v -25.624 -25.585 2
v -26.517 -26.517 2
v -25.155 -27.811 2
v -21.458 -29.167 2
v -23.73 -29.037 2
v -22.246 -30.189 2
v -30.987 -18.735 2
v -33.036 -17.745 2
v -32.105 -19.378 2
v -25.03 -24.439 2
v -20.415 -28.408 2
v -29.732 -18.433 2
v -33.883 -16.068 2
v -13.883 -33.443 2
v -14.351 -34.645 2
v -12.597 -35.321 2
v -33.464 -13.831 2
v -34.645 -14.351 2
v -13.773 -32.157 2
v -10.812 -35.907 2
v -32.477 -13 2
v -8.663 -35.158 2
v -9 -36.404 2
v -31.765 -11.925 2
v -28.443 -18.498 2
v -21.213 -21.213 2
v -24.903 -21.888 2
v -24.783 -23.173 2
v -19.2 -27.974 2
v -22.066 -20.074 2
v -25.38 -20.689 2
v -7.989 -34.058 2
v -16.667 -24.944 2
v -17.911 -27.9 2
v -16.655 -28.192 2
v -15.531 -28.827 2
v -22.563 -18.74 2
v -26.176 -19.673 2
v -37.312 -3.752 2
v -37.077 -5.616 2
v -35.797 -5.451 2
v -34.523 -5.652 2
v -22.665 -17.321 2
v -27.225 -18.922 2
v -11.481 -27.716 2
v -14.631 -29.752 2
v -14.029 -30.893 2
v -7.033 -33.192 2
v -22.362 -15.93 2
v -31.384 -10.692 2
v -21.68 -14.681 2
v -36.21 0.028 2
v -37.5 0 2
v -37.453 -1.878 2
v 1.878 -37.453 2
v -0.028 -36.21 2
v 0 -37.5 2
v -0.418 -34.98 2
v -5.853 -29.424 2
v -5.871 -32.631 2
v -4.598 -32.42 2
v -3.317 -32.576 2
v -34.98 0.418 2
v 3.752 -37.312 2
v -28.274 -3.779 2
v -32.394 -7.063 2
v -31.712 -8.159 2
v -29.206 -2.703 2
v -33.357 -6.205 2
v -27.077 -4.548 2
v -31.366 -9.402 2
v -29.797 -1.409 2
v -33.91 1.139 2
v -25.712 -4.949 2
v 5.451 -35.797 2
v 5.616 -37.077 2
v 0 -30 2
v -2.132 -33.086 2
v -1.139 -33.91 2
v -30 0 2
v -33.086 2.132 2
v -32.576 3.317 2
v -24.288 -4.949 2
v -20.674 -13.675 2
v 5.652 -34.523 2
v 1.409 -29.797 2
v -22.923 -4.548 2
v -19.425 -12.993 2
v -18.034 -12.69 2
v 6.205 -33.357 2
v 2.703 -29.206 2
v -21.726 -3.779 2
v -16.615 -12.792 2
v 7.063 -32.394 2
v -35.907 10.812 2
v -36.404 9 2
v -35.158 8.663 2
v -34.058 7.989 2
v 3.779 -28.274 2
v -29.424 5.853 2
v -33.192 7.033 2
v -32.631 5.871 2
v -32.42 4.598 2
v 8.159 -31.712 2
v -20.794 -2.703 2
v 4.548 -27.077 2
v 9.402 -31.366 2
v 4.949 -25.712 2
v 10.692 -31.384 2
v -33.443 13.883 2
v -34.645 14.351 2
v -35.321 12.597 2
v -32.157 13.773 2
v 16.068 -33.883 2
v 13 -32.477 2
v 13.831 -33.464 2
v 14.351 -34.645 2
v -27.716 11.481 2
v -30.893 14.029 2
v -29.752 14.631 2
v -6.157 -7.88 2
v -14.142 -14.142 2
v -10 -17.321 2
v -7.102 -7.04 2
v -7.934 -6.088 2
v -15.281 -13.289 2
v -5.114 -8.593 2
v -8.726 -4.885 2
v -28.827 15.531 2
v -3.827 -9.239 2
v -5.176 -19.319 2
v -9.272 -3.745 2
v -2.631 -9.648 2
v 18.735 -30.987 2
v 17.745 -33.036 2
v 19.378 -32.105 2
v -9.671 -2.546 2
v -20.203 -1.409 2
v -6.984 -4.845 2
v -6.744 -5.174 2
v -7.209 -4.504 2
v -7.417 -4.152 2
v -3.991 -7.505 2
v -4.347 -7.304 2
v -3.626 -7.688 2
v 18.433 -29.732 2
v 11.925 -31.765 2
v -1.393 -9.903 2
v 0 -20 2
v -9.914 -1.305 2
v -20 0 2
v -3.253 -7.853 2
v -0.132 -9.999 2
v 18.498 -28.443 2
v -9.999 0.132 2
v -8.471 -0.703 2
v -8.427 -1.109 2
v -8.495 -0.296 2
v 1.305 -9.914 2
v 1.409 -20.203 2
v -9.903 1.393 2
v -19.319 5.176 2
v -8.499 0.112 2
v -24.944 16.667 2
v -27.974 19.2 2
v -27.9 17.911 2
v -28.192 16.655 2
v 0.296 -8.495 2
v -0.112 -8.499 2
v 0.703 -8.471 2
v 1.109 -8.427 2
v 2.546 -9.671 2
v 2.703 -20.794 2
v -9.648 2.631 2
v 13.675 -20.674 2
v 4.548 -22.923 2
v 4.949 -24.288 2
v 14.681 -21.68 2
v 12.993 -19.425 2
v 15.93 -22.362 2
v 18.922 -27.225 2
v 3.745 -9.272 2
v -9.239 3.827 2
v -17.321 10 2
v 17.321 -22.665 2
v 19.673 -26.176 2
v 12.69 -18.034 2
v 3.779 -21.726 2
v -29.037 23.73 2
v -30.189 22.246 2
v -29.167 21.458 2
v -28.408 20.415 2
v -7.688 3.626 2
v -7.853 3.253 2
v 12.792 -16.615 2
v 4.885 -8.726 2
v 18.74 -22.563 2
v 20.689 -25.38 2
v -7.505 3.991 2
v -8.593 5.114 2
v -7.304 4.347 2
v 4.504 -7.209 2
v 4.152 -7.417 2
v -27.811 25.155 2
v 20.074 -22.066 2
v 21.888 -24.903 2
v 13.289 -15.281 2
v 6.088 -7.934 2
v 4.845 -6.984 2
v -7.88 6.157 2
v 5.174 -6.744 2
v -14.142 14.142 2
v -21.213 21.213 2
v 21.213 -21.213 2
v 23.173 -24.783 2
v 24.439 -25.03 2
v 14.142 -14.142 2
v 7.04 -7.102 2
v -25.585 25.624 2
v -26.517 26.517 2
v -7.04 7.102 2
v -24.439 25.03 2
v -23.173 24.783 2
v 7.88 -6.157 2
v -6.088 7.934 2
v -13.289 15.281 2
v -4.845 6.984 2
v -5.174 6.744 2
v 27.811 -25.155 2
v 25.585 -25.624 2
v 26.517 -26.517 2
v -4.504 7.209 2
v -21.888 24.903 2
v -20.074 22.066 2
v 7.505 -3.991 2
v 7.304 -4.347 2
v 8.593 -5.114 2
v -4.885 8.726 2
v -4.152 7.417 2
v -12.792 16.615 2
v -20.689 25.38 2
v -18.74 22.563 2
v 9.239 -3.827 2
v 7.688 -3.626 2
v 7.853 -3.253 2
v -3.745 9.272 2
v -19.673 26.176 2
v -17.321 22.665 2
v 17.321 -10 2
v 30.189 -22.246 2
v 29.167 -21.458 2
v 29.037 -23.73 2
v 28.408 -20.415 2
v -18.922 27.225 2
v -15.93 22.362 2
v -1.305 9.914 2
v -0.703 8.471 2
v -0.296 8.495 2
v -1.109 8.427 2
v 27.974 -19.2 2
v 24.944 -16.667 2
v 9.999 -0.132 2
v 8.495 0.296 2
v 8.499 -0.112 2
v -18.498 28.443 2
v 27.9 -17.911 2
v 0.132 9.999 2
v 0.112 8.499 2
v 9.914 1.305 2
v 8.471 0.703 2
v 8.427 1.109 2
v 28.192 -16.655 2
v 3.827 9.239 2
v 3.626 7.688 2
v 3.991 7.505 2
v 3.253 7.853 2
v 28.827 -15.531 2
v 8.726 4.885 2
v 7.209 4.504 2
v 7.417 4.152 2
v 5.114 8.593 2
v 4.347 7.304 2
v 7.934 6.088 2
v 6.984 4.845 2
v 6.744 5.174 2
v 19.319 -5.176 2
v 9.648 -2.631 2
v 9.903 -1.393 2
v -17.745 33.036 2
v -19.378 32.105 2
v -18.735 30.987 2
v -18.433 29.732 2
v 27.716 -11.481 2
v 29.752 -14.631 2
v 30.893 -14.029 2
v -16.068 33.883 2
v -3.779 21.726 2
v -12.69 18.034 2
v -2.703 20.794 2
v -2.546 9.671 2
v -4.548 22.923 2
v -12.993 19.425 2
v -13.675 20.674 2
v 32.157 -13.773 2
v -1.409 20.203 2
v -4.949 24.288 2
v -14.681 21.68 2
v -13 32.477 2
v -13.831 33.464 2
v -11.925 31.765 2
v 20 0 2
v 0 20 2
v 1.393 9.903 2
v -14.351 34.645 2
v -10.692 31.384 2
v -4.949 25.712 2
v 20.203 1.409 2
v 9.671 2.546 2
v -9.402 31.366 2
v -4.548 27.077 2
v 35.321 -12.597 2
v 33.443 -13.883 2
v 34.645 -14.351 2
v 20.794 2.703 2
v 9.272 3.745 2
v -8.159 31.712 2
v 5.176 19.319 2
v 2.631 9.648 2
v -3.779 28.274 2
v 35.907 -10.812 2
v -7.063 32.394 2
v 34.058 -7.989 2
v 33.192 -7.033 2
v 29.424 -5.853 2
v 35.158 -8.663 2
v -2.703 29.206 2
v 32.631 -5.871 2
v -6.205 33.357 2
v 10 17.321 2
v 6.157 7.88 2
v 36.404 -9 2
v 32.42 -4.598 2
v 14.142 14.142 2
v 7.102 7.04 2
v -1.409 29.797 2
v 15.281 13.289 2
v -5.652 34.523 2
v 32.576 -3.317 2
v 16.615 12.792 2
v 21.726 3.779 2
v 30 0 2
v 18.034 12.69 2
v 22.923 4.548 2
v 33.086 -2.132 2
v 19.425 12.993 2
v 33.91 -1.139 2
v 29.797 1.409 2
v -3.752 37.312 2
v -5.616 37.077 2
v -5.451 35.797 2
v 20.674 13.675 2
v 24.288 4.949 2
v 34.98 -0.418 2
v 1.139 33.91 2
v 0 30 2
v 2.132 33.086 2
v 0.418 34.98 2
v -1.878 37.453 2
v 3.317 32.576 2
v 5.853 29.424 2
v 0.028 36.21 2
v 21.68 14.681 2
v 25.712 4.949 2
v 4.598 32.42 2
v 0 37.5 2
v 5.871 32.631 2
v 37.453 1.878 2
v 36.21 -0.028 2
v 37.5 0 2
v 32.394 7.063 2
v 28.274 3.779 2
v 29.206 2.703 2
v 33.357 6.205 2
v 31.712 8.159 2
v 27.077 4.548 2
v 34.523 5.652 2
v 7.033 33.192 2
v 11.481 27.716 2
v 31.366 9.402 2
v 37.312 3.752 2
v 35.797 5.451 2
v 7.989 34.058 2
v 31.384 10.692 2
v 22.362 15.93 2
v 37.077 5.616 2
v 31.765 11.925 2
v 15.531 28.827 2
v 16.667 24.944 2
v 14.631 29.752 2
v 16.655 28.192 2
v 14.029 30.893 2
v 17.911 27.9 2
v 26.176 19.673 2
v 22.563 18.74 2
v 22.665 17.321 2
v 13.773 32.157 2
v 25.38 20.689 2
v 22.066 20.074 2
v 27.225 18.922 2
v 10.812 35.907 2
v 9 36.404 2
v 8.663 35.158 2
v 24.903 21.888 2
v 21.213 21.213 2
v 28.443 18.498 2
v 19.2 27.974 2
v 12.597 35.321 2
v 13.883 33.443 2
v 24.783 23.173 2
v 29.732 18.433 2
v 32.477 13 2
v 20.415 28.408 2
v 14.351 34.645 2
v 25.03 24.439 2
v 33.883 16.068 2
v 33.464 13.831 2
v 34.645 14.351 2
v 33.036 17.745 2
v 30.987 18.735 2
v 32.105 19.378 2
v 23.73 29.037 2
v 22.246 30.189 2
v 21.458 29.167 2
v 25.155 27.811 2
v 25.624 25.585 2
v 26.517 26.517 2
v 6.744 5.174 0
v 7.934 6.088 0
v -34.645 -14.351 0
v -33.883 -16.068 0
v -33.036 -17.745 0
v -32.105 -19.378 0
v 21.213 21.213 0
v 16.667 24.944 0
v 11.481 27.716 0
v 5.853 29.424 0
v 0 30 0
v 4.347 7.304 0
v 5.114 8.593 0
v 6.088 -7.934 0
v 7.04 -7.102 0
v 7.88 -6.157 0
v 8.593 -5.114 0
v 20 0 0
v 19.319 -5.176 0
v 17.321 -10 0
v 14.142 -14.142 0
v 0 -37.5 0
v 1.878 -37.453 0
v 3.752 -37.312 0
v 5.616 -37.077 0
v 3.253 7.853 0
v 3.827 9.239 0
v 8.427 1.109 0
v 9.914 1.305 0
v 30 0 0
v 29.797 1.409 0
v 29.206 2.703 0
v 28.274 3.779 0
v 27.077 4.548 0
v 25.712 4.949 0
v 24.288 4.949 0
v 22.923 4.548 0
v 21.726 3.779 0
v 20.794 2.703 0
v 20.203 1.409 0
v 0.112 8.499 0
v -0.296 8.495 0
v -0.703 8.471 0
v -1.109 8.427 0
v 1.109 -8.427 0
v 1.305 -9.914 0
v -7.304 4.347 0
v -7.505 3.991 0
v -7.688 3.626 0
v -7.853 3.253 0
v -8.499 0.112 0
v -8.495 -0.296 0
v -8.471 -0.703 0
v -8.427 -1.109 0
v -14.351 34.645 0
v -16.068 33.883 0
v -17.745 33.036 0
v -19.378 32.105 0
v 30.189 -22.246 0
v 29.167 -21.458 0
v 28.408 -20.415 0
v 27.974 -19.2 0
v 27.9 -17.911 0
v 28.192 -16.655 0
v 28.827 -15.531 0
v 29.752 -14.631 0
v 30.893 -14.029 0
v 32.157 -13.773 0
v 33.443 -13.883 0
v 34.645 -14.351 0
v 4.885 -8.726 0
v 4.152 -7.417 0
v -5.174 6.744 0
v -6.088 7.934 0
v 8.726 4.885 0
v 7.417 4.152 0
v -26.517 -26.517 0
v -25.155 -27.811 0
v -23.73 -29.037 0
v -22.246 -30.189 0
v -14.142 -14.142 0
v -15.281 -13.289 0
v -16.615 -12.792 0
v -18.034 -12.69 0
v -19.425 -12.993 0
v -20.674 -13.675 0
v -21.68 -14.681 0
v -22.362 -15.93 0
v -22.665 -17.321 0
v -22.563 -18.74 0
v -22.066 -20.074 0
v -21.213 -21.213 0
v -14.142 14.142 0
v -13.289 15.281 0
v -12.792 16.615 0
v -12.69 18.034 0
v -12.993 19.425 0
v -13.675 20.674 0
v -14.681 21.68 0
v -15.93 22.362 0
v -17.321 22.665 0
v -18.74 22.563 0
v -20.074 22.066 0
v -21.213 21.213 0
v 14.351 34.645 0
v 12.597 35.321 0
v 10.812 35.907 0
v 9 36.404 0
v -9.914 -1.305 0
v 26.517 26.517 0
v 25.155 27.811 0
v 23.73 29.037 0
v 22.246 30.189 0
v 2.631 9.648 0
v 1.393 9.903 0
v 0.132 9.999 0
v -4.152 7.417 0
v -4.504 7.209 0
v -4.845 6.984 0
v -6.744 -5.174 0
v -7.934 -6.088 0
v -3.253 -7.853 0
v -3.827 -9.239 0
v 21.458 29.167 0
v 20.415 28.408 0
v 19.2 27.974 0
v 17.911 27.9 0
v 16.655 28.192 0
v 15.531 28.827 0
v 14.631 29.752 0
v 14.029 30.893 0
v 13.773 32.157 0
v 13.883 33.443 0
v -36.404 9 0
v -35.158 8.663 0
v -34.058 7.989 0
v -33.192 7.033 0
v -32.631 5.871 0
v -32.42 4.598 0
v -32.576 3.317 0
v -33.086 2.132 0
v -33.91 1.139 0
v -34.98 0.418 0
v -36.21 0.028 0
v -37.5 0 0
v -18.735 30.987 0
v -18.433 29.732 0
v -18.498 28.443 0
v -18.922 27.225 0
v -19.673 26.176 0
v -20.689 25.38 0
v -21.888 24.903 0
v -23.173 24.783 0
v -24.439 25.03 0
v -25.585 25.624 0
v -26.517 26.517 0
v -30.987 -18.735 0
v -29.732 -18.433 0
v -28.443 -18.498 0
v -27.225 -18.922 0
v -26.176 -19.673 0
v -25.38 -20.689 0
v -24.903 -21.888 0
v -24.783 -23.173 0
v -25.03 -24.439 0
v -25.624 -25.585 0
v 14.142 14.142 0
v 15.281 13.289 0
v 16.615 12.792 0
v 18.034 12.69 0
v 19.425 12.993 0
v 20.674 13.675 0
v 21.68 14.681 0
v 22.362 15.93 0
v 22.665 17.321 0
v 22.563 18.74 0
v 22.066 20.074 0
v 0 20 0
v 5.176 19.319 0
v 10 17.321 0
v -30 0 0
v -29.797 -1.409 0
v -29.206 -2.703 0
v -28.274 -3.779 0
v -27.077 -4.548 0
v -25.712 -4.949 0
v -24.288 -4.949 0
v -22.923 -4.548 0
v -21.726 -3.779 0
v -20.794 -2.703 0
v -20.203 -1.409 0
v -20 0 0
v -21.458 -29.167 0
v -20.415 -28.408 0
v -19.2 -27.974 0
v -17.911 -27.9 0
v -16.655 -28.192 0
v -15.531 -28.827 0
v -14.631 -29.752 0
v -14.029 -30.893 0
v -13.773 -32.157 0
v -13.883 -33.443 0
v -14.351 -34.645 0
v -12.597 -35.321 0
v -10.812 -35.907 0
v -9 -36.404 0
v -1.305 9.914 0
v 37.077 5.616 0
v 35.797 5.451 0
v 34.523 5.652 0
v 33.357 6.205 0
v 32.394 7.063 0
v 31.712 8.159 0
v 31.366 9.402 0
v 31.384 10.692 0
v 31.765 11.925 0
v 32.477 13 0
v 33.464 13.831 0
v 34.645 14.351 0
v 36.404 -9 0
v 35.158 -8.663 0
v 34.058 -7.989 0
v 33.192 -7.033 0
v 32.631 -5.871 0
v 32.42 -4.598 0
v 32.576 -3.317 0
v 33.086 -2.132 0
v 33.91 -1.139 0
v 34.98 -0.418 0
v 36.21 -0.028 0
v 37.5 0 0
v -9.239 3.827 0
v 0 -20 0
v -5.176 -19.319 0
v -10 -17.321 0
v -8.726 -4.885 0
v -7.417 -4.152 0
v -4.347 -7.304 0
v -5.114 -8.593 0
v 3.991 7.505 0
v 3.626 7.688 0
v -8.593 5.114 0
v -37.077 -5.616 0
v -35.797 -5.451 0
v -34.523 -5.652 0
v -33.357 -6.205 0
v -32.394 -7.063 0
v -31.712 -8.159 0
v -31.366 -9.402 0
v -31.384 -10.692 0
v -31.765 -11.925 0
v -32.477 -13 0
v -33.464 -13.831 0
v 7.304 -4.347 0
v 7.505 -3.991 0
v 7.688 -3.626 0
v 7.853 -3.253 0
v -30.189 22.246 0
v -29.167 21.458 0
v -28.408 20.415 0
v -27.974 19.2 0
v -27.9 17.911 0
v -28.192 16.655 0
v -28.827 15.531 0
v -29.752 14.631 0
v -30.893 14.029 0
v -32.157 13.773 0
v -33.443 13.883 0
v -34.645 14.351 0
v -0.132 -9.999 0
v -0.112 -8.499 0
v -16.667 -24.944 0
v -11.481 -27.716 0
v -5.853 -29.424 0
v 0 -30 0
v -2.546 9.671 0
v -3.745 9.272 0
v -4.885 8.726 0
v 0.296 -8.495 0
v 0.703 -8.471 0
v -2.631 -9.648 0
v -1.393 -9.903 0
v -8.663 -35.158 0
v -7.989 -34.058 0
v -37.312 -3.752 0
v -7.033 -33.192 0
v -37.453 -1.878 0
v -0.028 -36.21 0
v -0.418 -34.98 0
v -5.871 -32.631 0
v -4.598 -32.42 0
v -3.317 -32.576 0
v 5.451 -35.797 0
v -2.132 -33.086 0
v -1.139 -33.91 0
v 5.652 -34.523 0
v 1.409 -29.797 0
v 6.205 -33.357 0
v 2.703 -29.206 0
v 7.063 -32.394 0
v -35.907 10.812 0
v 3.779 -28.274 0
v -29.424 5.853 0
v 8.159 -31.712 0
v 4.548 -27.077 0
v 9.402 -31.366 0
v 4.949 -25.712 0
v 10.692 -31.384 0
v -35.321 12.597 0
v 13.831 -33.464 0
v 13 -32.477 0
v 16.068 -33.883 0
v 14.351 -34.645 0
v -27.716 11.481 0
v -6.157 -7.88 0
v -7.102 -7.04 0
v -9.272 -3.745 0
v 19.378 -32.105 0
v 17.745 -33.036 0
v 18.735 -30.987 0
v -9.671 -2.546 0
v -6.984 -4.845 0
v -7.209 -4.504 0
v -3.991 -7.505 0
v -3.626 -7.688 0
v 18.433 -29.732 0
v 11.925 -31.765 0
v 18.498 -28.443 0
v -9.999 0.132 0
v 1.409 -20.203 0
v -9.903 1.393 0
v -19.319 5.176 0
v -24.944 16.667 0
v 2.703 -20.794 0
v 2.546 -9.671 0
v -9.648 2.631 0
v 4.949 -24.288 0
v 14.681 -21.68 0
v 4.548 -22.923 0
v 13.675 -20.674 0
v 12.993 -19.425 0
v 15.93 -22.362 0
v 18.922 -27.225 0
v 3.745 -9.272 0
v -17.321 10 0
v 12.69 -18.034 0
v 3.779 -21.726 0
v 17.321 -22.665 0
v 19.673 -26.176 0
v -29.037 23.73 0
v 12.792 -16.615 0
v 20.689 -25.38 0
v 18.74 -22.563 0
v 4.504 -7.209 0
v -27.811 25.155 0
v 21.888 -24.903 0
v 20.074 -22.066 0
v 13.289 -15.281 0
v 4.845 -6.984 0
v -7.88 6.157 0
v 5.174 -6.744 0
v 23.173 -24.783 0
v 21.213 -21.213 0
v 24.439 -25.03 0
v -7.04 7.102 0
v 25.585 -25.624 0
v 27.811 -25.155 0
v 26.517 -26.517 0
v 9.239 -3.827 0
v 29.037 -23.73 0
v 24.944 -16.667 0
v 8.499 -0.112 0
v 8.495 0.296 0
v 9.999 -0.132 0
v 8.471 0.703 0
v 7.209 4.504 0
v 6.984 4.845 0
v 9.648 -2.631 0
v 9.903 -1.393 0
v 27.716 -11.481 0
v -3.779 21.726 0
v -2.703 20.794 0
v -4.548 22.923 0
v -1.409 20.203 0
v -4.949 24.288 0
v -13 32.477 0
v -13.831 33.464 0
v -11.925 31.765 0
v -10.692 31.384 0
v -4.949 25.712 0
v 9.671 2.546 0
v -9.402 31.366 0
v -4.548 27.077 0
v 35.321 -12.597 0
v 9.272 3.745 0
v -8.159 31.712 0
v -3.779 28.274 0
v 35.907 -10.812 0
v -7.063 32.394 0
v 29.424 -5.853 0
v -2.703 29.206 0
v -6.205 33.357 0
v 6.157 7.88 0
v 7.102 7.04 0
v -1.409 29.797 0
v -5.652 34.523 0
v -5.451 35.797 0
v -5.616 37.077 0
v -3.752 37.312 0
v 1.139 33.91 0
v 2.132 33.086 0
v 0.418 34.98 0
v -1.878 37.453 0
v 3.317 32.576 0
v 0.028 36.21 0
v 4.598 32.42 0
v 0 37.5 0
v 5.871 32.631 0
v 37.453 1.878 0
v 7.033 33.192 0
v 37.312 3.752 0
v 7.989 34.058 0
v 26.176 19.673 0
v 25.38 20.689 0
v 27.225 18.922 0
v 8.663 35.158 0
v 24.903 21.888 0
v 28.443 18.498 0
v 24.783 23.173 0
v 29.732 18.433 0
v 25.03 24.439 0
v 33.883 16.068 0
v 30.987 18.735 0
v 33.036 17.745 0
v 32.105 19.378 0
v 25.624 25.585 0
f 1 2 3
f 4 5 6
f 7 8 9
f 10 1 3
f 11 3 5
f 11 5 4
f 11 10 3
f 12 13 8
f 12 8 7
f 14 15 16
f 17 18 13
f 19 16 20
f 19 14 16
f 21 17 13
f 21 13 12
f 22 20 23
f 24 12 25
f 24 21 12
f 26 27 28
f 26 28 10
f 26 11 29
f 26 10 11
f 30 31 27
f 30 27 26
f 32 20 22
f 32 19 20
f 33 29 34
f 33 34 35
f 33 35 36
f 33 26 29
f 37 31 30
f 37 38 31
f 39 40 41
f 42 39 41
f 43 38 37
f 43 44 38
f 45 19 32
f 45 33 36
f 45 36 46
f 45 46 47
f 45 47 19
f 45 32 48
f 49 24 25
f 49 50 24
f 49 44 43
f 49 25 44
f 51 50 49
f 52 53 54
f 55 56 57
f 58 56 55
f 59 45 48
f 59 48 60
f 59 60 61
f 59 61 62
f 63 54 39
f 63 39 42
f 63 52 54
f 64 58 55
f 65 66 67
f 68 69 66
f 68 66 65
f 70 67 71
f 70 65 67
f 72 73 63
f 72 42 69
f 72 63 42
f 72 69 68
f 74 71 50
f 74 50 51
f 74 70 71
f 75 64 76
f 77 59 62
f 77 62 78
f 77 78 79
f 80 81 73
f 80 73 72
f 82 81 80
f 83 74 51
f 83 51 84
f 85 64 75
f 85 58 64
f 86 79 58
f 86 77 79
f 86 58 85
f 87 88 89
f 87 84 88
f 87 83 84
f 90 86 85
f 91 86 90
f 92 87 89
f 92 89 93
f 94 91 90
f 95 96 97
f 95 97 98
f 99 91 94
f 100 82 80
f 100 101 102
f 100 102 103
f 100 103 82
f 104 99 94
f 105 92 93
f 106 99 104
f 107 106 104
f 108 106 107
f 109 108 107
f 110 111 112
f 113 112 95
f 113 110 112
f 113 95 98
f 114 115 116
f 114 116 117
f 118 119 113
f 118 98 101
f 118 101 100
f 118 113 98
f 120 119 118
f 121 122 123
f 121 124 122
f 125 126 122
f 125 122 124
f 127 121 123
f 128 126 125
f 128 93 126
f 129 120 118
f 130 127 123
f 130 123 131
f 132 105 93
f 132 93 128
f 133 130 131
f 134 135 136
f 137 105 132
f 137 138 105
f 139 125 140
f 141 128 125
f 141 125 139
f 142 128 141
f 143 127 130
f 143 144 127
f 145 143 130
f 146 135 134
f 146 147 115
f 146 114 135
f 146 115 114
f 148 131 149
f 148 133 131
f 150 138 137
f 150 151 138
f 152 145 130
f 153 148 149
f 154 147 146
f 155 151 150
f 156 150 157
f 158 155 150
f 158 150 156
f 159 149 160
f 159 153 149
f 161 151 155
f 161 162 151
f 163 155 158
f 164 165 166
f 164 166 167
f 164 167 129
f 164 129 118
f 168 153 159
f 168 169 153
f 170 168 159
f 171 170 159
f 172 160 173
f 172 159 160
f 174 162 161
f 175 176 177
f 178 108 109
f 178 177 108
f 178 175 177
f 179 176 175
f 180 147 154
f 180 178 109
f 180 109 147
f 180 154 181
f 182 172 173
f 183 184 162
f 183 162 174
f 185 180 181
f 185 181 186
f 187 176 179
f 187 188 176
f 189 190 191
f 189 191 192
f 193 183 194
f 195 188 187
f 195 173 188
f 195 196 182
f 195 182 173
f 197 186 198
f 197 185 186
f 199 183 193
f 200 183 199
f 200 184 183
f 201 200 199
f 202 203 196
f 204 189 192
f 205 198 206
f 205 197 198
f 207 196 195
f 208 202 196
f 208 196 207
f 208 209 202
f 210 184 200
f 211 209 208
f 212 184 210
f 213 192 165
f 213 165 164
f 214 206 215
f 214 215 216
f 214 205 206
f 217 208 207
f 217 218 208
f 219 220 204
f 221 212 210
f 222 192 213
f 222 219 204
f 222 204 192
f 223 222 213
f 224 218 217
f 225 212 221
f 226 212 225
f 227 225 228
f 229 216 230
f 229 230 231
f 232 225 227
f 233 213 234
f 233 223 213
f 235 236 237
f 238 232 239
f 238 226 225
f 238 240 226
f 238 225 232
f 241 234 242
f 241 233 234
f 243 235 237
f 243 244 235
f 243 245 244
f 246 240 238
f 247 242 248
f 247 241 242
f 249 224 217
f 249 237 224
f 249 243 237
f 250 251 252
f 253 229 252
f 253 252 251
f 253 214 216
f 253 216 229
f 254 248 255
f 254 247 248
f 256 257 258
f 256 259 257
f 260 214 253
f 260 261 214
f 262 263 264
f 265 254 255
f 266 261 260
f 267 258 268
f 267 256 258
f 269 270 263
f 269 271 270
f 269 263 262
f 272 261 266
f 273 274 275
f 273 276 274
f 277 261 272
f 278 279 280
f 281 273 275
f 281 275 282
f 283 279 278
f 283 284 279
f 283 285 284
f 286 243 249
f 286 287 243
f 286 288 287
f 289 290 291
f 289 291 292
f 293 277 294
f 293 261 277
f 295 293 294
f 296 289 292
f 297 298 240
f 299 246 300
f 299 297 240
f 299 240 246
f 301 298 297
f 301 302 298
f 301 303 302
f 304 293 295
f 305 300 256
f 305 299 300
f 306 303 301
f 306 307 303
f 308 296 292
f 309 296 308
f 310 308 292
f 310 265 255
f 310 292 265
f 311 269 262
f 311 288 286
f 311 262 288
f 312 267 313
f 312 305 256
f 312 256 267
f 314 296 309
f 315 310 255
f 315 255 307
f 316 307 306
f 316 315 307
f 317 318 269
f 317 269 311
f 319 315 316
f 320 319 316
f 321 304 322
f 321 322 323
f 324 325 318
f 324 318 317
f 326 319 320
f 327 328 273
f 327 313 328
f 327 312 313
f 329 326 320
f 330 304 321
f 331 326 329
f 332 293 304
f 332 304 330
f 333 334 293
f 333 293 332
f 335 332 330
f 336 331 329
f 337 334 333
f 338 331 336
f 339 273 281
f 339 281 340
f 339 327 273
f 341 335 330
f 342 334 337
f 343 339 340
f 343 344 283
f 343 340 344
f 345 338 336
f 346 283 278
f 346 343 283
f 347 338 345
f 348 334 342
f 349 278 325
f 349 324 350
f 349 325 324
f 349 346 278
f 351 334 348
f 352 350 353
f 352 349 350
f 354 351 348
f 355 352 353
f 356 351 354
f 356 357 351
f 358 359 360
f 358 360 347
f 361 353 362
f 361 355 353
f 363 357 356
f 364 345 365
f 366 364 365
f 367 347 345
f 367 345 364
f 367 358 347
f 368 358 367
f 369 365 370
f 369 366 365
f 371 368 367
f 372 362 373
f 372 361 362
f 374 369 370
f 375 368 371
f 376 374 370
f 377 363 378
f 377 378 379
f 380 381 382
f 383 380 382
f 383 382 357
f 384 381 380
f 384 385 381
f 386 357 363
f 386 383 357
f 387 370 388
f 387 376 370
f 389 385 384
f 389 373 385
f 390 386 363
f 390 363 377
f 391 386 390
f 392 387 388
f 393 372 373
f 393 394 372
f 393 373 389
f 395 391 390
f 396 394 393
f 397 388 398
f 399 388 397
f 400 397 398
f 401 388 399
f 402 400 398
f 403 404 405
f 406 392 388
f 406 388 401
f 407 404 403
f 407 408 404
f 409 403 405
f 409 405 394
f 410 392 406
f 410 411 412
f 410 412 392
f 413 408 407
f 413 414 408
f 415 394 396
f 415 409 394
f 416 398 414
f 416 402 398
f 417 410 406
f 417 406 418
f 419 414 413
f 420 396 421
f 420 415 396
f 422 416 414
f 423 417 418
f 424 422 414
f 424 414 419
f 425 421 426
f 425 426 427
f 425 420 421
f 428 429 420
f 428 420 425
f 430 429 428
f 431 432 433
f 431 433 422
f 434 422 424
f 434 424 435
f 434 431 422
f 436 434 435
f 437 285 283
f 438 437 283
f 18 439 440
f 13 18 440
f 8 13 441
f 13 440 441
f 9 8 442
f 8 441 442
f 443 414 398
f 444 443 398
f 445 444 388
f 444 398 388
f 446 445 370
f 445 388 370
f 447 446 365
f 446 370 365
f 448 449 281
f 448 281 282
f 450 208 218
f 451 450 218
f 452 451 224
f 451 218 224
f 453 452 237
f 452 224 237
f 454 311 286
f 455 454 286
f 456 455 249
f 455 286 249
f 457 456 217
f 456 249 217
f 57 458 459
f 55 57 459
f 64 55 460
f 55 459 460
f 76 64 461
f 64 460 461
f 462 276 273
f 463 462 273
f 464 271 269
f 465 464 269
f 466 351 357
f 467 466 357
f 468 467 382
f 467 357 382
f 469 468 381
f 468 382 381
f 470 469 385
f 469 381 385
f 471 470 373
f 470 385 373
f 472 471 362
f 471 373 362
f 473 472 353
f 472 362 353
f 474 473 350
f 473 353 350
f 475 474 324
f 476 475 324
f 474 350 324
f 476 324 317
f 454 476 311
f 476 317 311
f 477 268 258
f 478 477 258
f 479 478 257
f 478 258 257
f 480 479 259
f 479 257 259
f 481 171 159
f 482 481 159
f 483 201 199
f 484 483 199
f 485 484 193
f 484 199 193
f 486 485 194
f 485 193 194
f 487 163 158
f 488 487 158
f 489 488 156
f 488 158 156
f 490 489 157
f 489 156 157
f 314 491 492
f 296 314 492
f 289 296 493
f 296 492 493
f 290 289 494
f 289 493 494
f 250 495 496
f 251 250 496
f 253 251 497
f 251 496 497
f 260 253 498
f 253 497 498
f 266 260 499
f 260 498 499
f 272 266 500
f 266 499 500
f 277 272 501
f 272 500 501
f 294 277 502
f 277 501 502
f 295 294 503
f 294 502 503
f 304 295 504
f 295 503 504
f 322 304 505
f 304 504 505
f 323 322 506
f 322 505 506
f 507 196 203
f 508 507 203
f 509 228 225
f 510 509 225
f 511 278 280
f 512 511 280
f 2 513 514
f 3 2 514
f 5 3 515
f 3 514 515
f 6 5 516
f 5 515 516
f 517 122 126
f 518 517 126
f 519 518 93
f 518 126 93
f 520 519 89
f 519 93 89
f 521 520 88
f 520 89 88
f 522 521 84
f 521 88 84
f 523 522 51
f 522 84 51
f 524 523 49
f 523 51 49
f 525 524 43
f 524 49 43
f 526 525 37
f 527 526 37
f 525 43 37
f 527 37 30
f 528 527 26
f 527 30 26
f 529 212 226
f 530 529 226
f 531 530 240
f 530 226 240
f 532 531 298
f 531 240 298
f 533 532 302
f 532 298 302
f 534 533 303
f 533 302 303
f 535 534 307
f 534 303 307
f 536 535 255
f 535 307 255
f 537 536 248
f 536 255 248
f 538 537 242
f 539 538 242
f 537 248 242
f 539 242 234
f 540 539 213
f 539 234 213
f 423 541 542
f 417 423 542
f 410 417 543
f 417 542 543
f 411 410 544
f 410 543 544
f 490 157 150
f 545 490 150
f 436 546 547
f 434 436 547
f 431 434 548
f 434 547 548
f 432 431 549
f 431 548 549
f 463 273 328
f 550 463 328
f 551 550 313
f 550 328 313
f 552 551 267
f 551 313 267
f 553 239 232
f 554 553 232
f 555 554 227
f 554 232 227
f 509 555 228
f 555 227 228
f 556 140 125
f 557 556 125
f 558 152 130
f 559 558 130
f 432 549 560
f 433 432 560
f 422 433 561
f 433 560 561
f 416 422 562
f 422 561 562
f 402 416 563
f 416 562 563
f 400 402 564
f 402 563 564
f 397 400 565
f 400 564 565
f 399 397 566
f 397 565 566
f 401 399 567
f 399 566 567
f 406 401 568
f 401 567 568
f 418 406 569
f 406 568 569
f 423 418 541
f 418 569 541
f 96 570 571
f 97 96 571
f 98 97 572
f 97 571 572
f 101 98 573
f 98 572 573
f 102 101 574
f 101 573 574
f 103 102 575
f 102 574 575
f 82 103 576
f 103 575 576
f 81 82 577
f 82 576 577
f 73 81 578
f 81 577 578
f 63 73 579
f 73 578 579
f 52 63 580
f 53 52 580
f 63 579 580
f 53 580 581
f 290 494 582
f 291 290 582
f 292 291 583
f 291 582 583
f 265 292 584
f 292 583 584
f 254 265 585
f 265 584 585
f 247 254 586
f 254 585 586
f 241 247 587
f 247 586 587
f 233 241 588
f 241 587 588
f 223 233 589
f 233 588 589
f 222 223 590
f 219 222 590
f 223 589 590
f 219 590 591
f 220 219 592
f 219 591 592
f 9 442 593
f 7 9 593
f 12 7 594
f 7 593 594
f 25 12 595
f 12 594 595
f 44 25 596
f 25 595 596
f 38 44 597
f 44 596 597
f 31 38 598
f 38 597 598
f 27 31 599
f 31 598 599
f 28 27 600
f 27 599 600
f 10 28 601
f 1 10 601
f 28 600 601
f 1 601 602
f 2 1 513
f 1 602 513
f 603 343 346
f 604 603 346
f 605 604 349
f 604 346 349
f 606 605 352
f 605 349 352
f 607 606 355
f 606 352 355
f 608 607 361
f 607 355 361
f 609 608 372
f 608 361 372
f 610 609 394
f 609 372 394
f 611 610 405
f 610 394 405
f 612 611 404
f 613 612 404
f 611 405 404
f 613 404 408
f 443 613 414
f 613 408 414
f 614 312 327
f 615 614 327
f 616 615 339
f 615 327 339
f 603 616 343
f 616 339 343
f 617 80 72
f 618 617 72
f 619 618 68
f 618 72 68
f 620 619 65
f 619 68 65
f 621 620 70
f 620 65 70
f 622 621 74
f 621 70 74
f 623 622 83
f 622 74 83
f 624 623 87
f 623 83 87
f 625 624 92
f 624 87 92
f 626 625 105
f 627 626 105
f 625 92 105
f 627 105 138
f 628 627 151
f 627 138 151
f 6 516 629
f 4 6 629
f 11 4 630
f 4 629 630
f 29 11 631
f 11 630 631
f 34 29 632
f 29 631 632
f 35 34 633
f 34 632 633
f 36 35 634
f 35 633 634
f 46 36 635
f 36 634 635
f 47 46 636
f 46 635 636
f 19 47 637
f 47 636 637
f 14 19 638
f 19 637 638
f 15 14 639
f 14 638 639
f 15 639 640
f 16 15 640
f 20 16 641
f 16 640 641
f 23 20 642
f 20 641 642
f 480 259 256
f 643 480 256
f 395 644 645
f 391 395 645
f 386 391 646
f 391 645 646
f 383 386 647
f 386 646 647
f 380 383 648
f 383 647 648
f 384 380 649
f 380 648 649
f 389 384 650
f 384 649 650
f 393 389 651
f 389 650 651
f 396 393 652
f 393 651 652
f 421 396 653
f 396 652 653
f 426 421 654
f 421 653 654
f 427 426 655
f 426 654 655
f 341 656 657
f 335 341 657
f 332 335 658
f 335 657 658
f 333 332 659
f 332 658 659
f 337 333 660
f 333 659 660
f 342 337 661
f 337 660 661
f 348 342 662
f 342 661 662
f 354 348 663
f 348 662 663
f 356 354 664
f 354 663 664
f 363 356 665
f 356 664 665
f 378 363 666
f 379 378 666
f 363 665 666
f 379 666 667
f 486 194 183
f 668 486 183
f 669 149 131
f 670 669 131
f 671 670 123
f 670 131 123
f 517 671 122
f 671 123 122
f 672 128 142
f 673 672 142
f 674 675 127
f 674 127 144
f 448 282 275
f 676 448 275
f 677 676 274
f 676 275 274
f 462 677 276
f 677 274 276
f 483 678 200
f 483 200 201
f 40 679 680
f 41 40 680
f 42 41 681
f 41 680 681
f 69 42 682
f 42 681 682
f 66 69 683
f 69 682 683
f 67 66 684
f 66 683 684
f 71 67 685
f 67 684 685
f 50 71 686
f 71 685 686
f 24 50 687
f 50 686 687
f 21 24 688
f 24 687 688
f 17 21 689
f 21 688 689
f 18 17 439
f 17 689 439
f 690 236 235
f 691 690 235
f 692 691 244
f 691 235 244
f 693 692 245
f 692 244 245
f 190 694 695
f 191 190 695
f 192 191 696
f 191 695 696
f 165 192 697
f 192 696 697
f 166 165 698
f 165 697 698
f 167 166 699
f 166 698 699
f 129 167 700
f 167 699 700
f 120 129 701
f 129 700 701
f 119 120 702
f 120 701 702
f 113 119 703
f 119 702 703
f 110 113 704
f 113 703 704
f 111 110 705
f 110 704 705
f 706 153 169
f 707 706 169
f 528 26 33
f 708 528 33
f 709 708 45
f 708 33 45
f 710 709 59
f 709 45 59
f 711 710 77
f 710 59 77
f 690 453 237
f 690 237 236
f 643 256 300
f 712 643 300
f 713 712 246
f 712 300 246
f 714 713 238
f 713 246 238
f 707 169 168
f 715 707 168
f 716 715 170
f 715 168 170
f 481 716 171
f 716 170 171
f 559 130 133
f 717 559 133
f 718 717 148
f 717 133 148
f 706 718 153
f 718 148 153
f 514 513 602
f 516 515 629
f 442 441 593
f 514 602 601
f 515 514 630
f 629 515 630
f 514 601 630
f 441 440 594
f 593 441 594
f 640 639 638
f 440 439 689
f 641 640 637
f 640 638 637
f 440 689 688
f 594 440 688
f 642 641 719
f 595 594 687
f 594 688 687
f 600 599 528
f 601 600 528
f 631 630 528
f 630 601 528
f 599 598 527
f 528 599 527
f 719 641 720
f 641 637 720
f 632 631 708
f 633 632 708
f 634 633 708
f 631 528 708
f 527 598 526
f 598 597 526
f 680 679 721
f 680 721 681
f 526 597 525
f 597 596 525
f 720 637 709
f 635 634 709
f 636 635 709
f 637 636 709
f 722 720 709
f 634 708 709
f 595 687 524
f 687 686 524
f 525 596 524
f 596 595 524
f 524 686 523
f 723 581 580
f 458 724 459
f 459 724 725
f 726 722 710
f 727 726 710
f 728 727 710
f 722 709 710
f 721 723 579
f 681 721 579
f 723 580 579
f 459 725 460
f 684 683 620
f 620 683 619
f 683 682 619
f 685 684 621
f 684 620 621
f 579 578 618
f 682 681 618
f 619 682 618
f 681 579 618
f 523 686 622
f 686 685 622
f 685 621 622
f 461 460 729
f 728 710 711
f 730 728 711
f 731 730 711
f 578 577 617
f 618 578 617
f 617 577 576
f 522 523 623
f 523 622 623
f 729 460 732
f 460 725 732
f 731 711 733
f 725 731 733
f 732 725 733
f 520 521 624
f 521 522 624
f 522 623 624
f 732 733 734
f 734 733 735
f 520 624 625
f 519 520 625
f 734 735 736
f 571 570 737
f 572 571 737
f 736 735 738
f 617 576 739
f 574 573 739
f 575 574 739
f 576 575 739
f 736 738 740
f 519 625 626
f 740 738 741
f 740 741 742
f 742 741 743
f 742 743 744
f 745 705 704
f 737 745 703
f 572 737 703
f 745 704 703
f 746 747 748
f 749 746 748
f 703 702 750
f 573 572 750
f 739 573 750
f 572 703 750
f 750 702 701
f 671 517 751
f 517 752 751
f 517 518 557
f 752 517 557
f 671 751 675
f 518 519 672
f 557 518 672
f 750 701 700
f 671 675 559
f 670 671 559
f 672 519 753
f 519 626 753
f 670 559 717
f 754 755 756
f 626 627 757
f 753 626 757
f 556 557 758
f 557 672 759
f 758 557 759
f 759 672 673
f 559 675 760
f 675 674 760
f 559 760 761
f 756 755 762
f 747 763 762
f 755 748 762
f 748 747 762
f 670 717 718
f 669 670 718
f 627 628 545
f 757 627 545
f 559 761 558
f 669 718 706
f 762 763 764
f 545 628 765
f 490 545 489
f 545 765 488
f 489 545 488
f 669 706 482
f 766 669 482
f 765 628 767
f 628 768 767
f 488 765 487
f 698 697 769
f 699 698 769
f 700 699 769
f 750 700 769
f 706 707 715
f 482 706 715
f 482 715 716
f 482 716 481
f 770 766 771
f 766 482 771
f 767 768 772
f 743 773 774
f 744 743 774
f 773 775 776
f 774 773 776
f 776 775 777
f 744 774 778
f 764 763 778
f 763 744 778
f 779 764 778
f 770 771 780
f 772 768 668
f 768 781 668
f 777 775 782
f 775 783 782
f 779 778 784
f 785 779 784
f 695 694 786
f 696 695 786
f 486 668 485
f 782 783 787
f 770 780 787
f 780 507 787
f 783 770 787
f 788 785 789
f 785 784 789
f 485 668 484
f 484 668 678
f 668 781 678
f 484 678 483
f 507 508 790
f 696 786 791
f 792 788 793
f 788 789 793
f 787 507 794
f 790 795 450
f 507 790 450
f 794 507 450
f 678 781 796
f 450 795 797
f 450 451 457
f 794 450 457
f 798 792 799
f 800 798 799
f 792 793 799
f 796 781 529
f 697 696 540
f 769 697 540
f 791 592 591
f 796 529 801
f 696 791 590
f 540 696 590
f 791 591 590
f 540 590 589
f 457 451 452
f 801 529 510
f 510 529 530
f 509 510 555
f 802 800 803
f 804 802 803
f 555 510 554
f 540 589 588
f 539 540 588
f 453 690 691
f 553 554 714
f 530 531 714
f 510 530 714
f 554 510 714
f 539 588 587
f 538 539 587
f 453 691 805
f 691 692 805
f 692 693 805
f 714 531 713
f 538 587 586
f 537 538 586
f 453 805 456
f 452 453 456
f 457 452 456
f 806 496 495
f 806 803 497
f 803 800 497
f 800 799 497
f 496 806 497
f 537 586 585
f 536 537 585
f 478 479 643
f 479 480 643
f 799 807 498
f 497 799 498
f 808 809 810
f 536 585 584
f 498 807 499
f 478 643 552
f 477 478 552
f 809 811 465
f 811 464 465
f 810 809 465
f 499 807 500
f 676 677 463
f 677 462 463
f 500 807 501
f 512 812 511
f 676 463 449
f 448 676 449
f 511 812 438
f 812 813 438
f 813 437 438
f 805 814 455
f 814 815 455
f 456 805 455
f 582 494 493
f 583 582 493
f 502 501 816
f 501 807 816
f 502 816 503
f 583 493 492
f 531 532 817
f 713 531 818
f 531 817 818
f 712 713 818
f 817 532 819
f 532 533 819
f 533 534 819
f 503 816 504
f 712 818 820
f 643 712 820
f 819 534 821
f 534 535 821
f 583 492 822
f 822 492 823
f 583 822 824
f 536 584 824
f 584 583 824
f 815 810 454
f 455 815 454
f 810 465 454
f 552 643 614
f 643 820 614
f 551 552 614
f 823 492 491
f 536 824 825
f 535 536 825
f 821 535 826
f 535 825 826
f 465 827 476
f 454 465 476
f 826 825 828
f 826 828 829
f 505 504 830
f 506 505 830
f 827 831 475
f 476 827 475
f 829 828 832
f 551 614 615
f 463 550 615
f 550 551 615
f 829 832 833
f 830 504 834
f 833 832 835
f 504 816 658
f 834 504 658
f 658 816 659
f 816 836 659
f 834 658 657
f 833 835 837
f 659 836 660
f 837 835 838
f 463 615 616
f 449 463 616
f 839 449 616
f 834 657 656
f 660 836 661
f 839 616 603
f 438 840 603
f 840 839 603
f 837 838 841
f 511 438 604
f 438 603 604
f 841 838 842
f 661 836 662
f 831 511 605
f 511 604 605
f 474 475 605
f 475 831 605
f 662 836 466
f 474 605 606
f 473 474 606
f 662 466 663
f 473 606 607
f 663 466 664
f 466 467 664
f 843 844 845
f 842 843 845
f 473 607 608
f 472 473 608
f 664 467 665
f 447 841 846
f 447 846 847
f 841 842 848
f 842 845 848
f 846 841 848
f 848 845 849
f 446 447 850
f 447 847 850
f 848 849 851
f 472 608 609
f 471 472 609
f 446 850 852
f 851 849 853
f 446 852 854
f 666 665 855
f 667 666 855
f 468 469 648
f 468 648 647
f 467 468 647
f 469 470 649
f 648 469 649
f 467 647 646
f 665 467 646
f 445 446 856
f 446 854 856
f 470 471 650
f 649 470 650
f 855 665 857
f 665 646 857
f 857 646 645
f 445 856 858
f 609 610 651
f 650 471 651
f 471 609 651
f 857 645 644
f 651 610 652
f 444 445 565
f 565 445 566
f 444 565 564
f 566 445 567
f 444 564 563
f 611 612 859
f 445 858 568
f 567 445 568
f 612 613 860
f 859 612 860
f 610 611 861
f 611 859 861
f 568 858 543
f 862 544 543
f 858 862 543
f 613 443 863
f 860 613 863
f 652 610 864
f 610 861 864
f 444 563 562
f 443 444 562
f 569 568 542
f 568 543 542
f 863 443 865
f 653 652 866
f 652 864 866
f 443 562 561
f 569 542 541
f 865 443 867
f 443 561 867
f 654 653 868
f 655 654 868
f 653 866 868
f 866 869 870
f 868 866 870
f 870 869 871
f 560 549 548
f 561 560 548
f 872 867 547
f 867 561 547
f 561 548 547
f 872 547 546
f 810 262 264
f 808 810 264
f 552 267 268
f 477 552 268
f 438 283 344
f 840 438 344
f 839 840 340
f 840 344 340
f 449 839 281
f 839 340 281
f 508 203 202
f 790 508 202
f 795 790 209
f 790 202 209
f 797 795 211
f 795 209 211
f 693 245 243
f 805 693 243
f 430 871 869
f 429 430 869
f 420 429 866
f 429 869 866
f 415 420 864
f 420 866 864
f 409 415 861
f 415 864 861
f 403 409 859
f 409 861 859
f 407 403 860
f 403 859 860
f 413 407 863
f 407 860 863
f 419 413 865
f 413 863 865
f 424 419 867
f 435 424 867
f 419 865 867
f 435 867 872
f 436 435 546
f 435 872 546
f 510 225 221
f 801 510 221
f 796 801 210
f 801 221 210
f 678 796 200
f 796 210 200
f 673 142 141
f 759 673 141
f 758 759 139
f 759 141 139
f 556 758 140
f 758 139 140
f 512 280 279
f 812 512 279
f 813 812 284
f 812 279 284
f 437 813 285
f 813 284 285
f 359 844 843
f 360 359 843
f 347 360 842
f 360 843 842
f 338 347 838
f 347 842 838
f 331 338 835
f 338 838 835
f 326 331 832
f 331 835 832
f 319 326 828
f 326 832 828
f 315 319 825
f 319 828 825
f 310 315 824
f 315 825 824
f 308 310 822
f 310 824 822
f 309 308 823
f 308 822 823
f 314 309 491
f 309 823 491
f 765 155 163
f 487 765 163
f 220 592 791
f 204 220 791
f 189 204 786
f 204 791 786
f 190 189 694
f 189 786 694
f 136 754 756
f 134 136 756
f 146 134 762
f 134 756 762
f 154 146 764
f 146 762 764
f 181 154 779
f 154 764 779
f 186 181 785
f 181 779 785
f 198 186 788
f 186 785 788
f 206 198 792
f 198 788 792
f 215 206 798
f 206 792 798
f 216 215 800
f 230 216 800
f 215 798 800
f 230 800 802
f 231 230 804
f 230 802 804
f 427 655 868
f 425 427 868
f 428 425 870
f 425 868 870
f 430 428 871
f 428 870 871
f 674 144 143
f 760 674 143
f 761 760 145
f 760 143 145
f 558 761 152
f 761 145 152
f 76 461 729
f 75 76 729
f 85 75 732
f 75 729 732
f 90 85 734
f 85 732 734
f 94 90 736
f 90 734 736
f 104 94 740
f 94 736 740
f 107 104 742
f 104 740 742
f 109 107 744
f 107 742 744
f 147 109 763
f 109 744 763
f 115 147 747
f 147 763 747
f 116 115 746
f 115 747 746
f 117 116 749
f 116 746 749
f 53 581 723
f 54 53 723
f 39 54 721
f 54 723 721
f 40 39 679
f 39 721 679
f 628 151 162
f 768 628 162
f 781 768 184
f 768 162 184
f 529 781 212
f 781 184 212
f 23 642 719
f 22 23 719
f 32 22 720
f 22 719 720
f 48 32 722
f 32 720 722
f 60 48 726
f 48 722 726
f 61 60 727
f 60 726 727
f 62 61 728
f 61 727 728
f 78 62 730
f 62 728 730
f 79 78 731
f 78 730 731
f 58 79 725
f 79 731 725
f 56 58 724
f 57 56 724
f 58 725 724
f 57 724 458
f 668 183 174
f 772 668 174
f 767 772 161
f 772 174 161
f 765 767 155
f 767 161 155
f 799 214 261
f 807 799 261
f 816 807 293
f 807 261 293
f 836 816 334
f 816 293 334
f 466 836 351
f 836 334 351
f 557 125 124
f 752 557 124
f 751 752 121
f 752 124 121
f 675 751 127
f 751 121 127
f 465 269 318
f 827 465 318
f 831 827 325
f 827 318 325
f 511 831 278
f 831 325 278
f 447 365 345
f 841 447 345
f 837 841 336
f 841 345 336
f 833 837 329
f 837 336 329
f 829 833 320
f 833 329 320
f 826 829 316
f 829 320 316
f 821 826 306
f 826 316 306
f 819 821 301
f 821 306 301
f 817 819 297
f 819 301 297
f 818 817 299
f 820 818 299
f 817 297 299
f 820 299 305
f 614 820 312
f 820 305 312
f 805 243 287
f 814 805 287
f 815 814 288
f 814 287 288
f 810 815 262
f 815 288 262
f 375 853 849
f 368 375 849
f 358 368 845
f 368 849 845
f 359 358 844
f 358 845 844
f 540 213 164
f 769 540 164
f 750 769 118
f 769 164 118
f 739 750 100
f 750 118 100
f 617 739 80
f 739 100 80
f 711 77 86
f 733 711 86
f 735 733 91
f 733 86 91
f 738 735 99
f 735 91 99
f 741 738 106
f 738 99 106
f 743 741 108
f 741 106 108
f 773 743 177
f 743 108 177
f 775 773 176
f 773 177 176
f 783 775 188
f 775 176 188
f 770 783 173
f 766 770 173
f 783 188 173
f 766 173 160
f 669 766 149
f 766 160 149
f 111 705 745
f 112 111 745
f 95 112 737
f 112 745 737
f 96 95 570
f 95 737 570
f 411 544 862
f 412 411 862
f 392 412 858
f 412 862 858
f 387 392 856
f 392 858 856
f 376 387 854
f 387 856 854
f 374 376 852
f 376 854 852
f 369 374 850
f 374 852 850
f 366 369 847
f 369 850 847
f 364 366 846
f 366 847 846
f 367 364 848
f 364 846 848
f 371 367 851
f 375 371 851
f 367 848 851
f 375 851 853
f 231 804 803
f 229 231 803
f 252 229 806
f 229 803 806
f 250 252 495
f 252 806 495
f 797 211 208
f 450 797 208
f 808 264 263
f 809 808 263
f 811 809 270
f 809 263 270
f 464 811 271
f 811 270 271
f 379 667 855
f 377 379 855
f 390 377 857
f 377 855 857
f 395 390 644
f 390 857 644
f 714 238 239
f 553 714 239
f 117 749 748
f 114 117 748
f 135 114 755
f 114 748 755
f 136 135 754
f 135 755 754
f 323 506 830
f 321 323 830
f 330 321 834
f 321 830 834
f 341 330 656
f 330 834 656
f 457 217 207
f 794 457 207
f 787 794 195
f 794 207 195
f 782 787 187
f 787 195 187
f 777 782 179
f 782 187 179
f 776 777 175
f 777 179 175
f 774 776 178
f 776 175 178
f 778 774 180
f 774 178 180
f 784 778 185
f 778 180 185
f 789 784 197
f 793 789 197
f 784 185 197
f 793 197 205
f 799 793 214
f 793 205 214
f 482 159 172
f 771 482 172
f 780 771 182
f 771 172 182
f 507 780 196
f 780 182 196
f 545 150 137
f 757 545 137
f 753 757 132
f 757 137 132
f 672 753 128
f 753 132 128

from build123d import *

# Parameters (mm, degrees)
F1_DEPTH = 2
F3_DEPTH = 25
F5_DEPTH = 2


with BuildPart() as f1:
    # F0 (on Top) → F1 (new body)
    with BuildSketch(Plane.XY):
        with BuildLine():
            ThreePointArc((36.403983, -9), (32.451992, -3.951992), (37.5, 0))
            ThreePointArc((37.5, 0), (37.394112, 2.816094), (37.077046, 5.616285))
            ThreePointArc((37.077046, 5.616285), (31.494093, 8.767675), (34.645482, 14.350629))
            ThreePointArc((34.645482, 14.350629), (33.469982, 16.911839), (32.105464, 19.377542))
            ThreePointArc((32.105464, 19.377542), (25.741503, 20.152543), (26.516504, 26.516504))
            ThreePointArc((26.516504, 26.516504), (24.450351, 28.43291), (22.246117, 30.188744))
            ThreePointArc((22.246117, 30.188744), (16.070004, 28.469369), (14.350629, 34.645482))
            ThreePointArc((14.350629, 34.645482), (11.708375, 35.625327), (9, 36.403983))
            ThreePointArc((9, 36.403983), (3.951992, 32.451992), (0, 37.5))
            ThreePointArc((0, 37.5), (-2.816094, 37.394112), (-5.616285, 37.077046))
            ThreePointArc((-5.616285, 37.077046), (-8.767675, 31.494093), (-14.350629, 34.645482))
            ThreePointArc((-14.350629, 34.645482), (-16.911839, 33.469982), (-19.377542, 32.105464))
            ThreePointArc((-19.377542, 32.105464), (-20.152543, 25.741503), (-26.516504, 26.516504))
            ThreePointArc((-26.516504, 26.516504), (-28.43291, 24.450351), (-30.188744, 22.246117))
            ThreePointArc((-30.188744, 22.246117), (-28.469369, 16.070004), (-34.645482, 14.350629))
            ThreePointArc((-34.645482, 14.350629), (-35.625327, 11.708375), (-36.403983, 9))
            ThreePointArc((-36.403983, 9), (-32.451992, 3.951992), (-37.5, 0))
            ThreePointArc((-37.5, 0), (-37.394112, -2.816094), (-37.077046, -5.616285))
            ThreePointArc((-37.077046, -5.616285), (-31.494093, -8.767675), (-34.645482, -14.350629))
            ThreePointArc((-34.645482, -14.350629), (-33.469982, -16.911839), (-32.105464, -19.377542))
            ThreePointArc((-32.105464, -19.377542), (-25.741503, -20.152543), (-26.516504, -26.516504))
            ThreePointArc((-26.516504, -26.516504), (-24.450351, -28.43291), (-22.246117, -30.188744))
            ThreePointArc((-22.246117, -30.188744), (-16.070004, -28.469369), (-14.350629, -34.645482))
            ThreePointArc((-14.350629, -34.645482), (-11.708375, -35.625327), (-9, -36.403983))
            ThreePointArc((-9, -36.403983), (-3.951992, -32.451992), (0, -37.5))
            ThreePointArc((0, -37.5), (2.816094, -37.394112), (5.616285, -37.077046))
            ThreePointArc((5.616285, -37.077046), (8.767675, -31.494093), (14.350629, -34.645482))
            ThreePointArc((14.350629, -34.645482), (16.911839, -33.469982), (19.377542, -32.105464))
            ThreePointArc((19.377542, -32.105464), (20.152543, -25.741503), (26.516504, -26.516504))
            ThreePointArc((26.516504, -26.516504), (28.43291, -24.450351), (30.188744, -22.246117))
            ThreePointArc((30.188744, -22.246117), (28.469369, -16.070004), (34.645482, -14.350629))
            ThreePointArc((34.645482, -14.350629), (35.625327, -11.708375), (36.403983, -9))
        make_face()
    extrude(amount=F1_DEPTH)

    # F2 (on face) → F3 (cut)
    with BuildSketch(Plane.XY.offset(2)):
        with BuildLine():
            ThreePointArc((-20, 0), (-18.477591, 7.653669), (-14.142136, 14.142136))
            ThreePointArc((-14.142136, 14.142136), (-14.142136, 21.213203), (-21.213203, 21.213203))
            ThreePointArc((-21.213203, 21.213203), (-27.716386, 11.480503), (-30, 0))
            ThreePointArc((-30, 0), (-25, -5), (-20, 0))
        make_face()
        with BuildLine():
            ThreePointArc((0, 20), (7.653669, 18.477591), (14.142136, 14.142136))
            ThreePointArc((14.142136, 14.142136), (21.213203, 14.142136), (21.213203, 21.213203))
            ThreePointArc((21.213203, 21.213203), (11.480503, 27.716386), (0, 30))
            ThreePointArc((0, 30), (-5, 25), (0, 20))
        make_face()
        with BuildLine():
            ThreePointArc((20, 0), (18.477591, -7.653669), (14.142136, -14.142136))
            ThreePointArc((14.142136, -14.142136), (14.142136, -21.213203), (21.213203, -21.213203))
            ThreePointArc((21.213203, -21.213203), (27.716386, -11.480503), (30, 0))
            ThreePointArc((30, 0), (25, 5), (20, 0))
        make_face()
        with BuildLine():
            ThreePointArc((0, -20), (-7.653669, -18.477591), (-14.142136, -14.142136))
            ThreePointArc((-14.142136, -14.142136), (-21.213203, -14.142136), (-21.213203, -21.213203))
            ThreePointArc((-21.213203, -21.213203), (-11.480503, -27.716386), (0, -30))
            ThreePointArc((0, -30), (5, -25), (0, -20))
        make_face()
    extrude(amount=-F3_DEPTH, mode=Mode.SUBTRACT)

    # F4 (on face) → F5 (cut)
    with BuildSketch(Plane.XY.offset(2)):
        with BuildLine():
            Line((8.427281, 1.109473), (9.914449, 1.305262))
            ThreePointArc((9.914449, 1.305262), (9.490349, 3.151709), (8.72562, 4.885034))
            Line((8.72562, 4.885034), (7.416777, 4.152279))
            ThreePointArc((7.416777, 4.152279), (7.098564, 4.67551), (6.743503, 5.174472))
            Line((6.743503, 5.174472), (7.933533, 6.087614))
            ThreePointArc((7.933533, 6.087614), (6.643029, 7.474635), (5.114091, 8.593374))
            Line((5.114091, 8.593374), (4.346978, 7.304368))
            ThreePointArc((4.346978, 7.304368), (3.809781, 7.598392), (3.252809, 7.852976))
            Line((3.252809, 7.852976), (3.826834, 9.238795))
            ThreePointArc((3.826834, 9.238795), (2.015715, 9.794738), (0.132246, 9.999126))
            Line((0.132246, 9.999126), (0.112409, 8.499257))
            ThreePointArc((0.112409, 8.499257), (-0.499829, 8.485291), (-1.109473, 8.427281))
            Line((-1.109473, 8.427281), (-1.305262, 9.914449))
            ThreePointArc((-1.305262, 9.914449), (-3.151709, 9.490349), (-4.885034, 8.72562))
            Line((-4.885034, 8.72562), (-4.152279, 7.416777))
            ThreePointArc((-4.152279, 7.416777), (-4.67551, 7.098564), (-5.174472, 6.743503))
            Line((-5.174472, 6.743503), (-6.087614, 7.933533))
            ThreePointArc((-6.087614, 7.933533), (-7.474635, 6.643029), (-8.593374, 5.114091))
            Line((-8.593374, 5.114091), (-7.304368, 4.346978))
            ThreePointArc((-7.304368, 4.346978), (-7.598392, 3.809781), (-7.852976, 3.252809))
            Line((-7.852976, 3.252809), (-9.238795, 3.826834))
            ThreePointArc((-9.238795, 3.826834), (-9.794738, 2.015715), (-9.999126, 0.132246))
            Line((-9.999126, 0.132246), (-8.499257, 0.112409))
            ThreePointArc((-8.499257, 0.112409), (-8.485291, -0.499829), (-8.427281, -1.109473))
            Line((-8.427281, -1.109473), (-9.914449, -1.305262))
            ThreePointArc((-9.914449, -1.305262), (-9.490349, -3.151709), (-8.72562, -4.885034))
            Line((-8.72562, -4.885034), (-7.416777, -4.152279))
            ThreePointArc((-7.416777, -4.152279), (-7.098564, -4.67551), (-6.743503, -5.174472))
            Line((-6.743503, -5.174472), (-7.933533, -6.087614))
            ThreePointArc((-7.933533, -6.087614), (-6.643029, -7.474635), (-5.114091, -8.593374))
            Line((-5.114091, -8.593374), (-4.346978, -7.304368))
            ThreePointArc((-4.346978, -7.304368), (-3.809781, -7.598392), (-3.252809, -7.852976))
            Line((-3.252809, -7.852976), (-3.826834, -9.238795))
            ThreePointArc((-3.826834, -9.238795), (-2.015715, -9.794738), (-0.132246, -9.999126))
            Line((-0.132246, -9.999126), (-0.112409, -8.499257))
            ThreePointArc((-0.112409, -8.499257), (0.499829, -8.485291), (1.109473, -8.427281))
            Line((1.109473, -8.427281), (1.305262, -9.914449))
            ThreePointArc((1.305262, -9.914449), (3.151709, -9.490349), (4.885034, -8.72562))
            Line((4.885034, -8.72562), (4.152279, -7.416777))
            ThreePointArc((4.152279, -7.416777), (4.67551, -7.098564), (5.174472, -6.743503))
            Line((5.174472, -6.743503), (6.087614, -7.933533))
            ThreePointArc((6.087614, -7.933533), (7.474635, -6.643029), (8.593374, -5.114091))
            Line((8.593374, -5.114091), (7.304368, -4.346978))
            ThreePointArc((7.304368, -4.346978), (7.598392, -3.809781), (7.852976, -3.252809))
            Line((7.852976, -3.252809), (9.238795, -3.826834))
            ThreePointArc((9.238795, -3.826834), (9.794738, -2.015715), (9.999126, -0.132246))
            Line((9.999126, -0.132246), (8.499257, -0.112409))
            ThreePointArc((8.499257, -0.112409), (8.485291, 0.499829), (8.427281, 1.109473))
        make_face()
    extrude(amount=-F5_DEPTH, mode=Mode.SUBTRACT)


solid = f1.part
